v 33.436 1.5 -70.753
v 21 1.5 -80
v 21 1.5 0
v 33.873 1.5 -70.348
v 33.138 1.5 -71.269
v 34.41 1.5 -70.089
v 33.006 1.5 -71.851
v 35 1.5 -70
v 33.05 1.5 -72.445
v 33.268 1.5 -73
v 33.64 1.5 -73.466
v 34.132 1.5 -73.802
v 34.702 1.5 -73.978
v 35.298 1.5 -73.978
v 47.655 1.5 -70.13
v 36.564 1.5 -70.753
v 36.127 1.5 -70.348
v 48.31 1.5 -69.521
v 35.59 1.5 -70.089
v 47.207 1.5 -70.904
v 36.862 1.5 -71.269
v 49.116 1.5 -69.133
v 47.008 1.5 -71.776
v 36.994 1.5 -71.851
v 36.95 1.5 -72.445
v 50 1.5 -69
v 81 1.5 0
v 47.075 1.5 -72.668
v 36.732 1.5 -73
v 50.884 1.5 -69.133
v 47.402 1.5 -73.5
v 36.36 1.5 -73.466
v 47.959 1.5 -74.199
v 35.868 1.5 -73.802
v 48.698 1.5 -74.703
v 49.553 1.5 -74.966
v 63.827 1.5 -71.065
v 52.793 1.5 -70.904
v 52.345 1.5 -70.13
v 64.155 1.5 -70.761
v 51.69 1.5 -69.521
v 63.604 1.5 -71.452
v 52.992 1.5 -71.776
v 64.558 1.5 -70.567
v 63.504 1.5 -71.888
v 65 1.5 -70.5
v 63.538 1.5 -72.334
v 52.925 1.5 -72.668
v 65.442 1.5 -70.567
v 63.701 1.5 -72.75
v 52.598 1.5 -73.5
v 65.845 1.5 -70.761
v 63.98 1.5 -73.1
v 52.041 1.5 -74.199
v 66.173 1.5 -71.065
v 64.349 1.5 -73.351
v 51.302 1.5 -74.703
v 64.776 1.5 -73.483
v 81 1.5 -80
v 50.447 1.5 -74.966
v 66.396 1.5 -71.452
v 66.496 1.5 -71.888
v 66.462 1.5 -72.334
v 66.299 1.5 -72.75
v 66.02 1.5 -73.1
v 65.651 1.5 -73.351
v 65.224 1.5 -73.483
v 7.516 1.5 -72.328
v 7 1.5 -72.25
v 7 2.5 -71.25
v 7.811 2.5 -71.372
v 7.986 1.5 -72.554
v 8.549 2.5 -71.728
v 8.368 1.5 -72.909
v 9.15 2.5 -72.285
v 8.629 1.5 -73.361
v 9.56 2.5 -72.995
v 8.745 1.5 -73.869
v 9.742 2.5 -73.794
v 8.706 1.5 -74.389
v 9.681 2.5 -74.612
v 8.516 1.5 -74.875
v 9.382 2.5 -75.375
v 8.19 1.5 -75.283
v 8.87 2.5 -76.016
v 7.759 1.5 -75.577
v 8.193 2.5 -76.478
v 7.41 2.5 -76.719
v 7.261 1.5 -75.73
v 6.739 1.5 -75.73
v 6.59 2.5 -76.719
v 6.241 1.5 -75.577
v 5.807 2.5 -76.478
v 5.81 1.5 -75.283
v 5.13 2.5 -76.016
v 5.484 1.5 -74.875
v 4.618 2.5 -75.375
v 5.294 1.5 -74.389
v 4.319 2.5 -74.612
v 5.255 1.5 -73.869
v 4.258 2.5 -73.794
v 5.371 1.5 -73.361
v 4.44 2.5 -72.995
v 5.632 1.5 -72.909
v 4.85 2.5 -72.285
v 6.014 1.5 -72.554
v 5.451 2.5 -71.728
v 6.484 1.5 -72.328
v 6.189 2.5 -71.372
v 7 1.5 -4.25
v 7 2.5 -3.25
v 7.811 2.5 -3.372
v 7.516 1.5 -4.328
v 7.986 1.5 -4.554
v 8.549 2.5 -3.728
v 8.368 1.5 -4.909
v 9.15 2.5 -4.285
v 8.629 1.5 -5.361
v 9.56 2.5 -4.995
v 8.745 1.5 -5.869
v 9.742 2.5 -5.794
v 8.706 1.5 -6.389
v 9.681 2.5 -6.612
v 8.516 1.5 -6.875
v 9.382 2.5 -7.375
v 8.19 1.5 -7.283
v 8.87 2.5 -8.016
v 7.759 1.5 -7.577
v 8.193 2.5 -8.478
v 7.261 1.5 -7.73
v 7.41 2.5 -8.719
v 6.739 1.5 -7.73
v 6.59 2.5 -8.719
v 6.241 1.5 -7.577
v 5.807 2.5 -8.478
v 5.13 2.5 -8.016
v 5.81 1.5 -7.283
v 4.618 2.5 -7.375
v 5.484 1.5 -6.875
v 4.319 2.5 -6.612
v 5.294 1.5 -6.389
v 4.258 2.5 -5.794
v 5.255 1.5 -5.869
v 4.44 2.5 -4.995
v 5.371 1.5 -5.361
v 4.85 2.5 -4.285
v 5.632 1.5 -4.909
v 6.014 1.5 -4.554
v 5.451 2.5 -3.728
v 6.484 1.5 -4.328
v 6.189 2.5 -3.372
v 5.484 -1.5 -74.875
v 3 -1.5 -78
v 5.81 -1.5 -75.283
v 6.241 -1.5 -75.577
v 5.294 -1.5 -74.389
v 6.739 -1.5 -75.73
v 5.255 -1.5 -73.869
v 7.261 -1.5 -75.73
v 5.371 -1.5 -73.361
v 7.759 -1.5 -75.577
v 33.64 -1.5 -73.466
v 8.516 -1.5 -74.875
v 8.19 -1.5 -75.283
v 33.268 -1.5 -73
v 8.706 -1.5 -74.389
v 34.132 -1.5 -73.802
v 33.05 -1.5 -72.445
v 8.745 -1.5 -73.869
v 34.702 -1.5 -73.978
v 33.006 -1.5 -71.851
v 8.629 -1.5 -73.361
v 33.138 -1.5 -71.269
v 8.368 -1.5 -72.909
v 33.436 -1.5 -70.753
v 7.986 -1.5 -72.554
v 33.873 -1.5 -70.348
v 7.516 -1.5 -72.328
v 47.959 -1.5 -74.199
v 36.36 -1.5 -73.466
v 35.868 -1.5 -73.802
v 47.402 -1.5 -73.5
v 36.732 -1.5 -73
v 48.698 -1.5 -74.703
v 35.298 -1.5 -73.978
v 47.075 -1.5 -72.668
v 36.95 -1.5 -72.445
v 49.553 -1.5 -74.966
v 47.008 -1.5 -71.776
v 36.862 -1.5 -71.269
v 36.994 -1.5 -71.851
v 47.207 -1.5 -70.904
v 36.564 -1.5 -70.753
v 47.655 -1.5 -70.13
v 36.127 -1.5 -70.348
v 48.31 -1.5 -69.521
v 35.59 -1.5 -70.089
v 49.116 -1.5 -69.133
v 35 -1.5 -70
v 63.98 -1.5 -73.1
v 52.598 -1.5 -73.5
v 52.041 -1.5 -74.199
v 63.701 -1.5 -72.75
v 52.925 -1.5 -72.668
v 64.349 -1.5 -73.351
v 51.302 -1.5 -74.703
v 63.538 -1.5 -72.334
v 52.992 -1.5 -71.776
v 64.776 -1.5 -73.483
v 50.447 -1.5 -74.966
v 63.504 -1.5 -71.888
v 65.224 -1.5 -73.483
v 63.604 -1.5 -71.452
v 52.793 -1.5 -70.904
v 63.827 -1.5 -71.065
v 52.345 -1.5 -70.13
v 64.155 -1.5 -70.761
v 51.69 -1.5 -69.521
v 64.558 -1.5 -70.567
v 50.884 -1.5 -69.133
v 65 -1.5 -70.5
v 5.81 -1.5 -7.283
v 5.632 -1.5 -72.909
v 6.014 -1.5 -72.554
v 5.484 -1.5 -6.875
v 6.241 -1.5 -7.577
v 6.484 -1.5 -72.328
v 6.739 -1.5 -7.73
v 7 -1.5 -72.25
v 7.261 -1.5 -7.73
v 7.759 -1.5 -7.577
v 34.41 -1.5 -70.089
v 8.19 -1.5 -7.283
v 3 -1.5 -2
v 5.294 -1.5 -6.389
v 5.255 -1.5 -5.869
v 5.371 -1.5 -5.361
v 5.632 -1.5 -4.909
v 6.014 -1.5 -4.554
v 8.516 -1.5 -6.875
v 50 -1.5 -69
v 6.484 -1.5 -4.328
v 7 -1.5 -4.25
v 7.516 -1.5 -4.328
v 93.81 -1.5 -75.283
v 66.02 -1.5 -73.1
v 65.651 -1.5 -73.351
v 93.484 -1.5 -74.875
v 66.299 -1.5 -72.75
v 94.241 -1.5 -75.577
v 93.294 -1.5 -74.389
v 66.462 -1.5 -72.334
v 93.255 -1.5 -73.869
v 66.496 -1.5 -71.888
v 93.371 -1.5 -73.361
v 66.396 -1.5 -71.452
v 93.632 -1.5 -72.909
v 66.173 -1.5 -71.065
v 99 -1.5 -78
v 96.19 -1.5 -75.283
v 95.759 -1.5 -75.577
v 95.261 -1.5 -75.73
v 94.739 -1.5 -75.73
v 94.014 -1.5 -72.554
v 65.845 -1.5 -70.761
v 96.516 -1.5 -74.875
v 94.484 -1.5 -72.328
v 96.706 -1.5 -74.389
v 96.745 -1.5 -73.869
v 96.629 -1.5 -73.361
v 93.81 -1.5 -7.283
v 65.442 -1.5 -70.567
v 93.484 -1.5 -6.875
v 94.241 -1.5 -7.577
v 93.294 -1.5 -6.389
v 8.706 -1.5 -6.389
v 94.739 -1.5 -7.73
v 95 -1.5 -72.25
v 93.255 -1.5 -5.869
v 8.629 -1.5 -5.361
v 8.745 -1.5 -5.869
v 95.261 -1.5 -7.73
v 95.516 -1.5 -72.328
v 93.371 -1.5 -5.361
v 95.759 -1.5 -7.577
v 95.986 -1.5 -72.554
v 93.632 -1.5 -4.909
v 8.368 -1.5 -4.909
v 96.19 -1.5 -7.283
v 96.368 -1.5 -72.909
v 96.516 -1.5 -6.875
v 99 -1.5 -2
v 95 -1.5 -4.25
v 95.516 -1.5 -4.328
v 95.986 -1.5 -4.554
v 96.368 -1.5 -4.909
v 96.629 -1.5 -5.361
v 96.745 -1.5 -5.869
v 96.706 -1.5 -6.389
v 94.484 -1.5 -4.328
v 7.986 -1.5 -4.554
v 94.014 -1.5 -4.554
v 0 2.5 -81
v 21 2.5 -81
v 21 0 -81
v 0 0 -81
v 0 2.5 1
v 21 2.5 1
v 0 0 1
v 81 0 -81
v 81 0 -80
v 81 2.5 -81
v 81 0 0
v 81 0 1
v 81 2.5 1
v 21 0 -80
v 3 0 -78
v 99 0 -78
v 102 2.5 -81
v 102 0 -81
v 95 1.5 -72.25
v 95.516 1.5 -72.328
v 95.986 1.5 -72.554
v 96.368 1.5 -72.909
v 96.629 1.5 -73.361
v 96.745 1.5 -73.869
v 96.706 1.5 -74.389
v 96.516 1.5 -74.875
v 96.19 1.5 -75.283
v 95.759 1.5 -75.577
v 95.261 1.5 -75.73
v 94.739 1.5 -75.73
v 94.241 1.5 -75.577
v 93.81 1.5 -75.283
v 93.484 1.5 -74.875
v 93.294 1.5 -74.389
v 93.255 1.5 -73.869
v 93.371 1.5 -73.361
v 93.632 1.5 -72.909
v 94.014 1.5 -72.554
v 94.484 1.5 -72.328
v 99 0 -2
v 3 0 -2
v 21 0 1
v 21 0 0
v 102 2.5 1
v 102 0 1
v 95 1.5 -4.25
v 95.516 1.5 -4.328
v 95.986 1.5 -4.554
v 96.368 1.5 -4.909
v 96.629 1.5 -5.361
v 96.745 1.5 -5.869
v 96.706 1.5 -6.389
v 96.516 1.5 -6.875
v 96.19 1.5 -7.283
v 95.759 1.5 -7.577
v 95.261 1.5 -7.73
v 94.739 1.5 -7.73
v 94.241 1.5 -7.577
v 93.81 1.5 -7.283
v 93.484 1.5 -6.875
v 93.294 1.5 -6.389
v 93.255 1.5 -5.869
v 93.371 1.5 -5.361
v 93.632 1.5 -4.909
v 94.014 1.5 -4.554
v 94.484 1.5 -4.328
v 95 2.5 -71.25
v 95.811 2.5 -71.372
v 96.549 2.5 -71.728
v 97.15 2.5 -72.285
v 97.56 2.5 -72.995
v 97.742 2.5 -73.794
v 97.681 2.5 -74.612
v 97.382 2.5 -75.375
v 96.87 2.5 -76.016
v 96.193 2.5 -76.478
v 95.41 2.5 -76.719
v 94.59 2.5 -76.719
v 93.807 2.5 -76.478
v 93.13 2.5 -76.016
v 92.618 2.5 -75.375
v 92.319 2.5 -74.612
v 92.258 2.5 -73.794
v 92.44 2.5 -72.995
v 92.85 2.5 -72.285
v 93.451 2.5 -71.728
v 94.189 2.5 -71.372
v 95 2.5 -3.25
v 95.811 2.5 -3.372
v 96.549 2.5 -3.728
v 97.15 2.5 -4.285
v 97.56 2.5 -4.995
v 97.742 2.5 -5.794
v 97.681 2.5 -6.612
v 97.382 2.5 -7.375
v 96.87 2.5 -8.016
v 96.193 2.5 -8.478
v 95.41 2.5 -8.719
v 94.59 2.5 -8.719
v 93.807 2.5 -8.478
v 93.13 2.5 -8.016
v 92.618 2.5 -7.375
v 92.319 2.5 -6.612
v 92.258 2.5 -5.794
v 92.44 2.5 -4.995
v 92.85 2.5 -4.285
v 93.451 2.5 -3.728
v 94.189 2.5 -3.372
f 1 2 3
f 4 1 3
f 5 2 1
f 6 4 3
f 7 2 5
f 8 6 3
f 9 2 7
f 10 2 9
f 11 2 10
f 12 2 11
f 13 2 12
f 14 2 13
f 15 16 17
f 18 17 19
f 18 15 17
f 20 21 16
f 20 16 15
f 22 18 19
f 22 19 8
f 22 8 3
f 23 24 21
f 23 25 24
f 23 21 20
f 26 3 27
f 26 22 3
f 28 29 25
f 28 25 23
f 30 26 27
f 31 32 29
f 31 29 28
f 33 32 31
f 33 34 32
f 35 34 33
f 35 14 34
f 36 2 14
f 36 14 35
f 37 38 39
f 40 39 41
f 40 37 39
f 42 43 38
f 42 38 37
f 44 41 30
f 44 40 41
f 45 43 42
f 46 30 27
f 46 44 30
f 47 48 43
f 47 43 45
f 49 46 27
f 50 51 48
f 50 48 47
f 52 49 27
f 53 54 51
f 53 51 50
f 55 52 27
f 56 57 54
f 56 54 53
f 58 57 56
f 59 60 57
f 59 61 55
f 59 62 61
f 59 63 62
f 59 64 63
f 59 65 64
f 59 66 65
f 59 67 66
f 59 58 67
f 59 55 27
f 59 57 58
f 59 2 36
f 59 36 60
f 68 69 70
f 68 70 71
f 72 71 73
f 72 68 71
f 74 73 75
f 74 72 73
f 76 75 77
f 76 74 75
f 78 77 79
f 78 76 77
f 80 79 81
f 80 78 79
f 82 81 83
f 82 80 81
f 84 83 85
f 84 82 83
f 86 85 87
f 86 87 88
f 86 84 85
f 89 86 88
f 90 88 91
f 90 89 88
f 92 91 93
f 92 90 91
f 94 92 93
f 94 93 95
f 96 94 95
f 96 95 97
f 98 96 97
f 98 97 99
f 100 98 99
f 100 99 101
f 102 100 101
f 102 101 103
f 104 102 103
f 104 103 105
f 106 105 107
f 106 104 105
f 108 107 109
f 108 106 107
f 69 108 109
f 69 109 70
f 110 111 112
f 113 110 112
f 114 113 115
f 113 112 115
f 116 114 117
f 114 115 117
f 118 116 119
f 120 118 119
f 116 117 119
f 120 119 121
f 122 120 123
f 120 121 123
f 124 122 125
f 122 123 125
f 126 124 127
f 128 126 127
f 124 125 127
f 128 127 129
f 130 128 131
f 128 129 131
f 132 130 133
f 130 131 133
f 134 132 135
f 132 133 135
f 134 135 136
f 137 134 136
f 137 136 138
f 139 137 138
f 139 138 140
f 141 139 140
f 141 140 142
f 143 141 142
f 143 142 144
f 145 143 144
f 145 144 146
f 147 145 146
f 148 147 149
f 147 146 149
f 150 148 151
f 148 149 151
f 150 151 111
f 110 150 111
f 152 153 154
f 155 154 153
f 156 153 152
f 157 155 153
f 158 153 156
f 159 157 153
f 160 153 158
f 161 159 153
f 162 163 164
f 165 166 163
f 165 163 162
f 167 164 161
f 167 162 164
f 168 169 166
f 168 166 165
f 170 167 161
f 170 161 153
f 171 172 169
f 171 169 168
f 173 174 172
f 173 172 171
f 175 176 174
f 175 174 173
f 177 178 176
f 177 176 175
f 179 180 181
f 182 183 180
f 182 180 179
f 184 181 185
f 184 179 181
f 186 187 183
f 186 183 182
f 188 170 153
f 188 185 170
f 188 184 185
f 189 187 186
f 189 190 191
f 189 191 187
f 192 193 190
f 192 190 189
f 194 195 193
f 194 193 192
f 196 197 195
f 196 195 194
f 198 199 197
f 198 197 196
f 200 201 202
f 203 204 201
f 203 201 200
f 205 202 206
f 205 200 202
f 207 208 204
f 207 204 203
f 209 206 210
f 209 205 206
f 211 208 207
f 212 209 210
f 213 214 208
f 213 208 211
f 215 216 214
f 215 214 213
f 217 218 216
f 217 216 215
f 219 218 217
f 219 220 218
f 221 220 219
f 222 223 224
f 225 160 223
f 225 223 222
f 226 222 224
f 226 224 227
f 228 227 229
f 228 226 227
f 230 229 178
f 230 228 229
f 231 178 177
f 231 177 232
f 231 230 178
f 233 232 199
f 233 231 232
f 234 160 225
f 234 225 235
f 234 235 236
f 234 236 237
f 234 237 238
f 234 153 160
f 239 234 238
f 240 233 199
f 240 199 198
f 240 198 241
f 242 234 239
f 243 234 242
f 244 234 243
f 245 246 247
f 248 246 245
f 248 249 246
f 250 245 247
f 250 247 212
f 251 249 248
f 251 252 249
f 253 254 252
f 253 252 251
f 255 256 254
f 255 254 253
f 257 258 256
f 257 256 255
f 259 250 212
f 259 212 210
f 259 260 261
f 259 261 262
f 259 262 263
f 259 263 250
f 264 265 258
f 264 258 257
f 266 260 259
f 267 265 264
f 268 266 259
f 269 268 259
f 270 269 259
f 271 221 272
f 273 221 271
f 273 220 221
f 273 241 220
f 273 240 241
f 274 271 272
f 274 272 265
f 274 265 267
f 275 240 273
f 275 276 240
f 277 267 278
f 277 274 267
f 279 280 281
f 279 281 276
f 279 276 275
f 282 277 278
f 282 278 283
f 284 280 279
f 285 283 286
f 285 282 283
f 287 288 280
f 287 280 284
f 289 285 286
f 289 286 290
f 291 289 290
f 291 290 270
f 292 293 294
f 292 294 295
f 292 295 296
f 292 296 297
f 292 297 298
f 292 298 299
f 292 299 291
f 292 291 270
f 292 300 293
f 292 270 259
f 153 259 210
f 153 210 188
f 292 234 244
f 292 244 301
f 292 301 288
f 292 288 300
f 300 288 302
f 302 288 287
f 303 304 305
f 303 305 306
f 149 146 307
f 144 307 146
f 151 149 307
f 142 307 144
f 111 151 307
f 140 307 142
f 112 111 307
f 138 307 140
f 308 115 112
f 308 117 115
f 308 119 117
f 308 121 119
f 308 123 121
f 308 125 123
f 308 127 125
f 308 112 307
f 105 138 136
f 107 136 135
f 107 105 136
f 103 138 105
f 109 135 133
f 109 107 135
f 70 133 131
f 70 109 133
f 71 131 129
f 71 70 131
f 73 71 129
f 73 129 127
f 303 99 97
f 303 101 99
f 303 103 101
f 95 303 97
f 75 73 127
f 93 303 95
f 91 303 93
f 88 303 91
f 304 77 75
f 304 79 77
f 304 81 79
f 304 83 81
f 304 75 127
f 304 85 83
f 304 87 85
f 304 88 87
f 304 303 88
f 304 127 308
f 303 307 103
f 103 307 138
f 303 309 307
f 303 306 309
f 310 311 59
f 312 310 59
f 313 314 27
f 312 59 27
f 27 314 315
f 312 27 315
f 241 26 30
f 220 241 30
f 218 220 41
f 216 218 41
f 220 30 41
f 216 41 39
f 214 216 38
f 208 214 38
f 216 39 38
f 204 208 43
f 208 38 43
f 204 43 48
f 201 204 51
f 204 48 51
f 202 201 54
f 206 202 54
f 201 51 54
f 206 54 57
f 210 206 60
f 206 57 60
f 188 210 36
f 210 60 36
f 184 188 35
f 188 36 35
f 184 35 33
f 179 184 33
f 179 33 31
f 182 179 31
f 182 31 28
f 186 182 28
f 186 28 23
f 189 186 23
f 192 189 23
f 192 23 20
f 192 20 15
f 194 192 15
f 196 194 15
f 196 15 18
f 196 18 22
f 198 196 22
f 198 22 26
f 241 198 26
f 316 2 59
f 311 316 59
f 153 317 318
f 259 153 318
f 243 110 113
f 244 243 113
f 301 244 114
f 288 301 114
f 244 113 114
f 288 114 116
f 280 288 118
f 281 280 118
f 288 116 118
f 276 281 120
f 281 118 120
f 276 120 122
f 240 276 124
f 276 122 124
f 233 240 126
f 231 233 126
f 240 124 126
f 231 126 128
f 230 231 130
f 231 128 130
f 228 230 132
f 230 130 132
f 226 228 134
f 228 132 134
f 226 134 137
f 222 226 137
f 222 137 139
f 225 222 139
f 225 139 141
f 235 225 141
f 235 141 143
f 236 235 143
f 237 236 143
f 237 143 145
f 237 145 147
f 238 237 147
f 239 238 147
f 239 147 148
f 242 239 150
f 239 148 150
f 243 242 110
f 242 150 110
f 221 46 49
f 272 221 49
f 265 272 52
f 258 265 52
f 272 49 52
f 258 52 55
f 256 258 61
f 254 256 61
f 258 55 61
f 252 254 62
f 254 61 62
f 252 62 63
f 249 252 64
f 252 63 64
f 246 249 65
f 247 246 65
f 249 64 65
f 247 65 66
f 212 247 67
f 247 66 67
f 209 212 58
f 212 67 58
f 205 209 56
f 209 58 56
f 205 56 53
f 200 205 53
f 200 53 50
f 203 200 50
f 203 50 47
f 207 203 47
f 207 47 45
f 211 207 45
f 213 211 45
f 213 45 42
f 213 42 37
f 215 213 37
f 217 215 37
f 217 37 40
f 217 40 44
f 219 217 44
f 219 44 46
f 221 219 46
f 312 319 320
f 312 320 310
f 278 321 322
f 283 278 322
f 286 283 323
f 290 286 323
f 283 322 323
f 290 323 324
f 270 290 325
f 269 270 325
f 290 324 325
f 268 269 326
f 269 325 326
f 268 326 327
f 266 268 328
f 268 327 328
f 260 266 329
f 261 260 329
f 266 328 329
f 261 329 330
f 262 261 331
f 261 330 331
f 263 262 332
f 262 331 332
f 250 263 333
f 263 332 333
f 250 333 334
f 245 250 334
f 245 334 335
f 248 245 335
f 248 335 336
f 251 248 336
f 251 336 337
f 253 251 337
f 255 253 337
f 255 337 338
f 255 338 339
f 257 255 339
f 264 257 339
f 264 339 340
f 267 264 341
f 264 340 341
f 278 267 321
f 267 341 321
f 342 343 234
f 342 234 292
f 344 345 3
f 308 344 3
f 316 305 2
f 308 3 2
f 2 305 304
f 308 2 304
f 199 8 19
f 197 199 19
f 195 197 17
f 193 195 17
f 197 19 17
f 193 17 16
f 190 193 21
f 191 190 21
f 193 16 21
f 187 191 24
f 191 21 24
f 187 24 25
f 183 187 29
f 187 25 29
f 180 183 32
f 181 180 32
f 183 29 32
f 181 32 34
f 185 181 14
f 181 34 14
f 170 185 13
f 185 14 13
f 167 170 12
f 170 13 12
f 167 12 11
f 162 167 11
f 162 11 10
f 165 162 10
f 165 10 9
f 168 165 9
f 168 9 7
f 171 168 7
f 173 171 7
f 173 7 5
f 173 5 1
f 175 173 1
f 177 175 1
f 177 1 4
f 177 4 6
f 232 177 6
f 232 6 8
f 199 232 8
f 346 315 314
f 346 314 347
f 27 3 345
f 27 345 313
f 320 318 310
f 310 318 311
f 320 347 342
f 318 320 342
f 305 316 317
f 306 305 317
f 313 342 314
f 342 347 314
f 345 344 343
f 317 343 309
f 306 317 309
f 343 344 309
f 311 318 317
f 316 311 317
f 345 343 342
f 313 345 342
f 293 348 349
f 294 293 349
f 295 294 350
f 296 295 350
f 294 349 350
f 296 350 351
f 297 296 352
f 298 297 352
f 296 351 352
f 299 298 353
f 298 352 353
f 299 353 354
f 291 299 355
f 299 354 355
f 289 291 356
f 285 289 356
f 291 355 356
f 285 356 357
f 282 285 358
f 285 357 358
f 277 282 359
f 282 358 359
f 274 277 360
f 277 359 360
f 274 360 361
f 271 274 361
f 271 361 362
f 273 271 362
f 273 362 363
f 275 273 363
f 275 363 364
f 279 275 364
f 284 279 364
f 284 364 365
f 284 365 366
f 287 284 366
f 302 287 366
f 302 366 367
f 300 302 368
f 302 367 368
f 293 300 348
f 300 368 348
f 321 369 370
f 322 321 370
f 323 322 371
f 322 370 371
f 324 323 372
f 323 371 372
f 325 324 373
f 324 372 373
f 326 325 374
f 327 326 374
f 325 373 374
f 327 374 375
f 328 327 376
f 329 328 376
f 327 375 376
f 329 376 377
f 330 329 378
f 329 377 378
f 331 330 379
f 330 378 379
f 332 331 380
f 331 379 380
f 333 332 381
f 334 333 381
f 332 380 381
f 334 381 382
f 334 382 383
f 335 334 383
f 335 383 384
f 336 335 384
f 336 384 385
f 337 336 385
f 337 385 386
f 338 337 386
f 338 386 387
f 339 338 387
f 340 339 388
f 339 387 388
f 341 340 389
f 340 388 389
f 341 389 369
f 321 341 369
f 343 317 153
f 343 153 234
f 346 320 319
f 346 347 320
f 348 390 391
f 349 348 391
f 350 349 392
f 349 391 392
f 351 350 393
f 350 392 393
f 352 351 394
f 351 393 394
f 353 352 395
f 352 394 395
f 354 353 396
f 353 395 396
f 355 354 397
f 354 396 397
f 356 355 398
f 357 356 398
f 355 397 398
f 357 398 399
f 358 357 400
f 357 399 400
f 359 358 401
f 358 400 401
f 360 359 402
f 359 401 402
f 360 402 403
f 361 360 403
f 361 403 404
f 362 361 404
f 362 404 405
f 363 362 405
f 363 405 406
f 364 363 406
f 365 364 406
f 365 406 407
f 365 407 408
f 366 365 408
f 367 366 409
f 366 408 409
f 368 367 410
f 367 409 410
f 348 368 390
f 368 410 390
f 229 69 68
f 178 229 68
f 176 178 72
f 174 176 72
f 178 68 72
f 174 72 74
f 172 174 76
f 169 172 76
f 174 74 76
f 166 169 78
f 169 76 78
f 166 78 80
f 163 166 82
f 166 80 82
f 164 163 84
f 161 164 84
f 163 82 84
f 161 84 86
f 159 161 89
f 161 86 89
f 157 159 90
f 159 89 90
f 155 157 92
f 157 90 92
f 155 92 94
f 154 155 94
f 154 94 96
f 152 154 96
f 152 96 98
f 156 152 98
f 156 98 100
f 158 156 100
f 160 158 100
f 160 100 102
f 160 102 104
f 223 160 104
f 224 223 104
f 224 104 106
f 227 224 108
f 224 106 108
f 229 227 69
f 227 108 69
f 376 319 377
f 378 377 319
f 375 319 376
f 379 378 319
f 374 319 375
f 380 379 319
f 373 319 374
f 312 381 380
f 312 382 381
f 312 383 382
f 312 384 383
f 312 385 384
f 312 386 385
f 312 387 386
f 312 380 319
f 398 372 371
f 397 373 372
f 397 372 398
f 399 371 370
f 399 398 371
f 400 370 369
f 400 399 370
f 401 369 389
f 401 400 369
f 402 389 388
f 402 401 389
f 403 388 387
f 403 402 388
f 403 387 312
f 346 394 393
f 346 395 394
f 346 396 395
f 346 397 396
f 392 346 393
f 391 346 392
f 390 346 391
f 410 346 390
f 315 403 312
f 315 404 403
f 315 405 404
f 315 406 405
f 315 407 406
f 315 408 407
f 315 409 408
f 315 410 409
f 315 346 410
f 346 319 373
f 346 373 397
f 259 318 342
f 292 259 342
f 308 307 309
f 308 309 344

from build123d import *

# Parameters (mm, degrees)
ESQUISSE1_W             = 102
ESQUISSE1_H             = 80
BOSS_EXTRU_1_DEPTH      = 1.5
ESQUISSE2_W             = 96
ESQUISSE2_H             = 76
BOSS_EXTRU_2_DEPTH      = 1.5
ESQUISSE3_R             = 1.75
ESQUISSE3_R_2           = 2
ESQUISSE3_R_3           = 3
ESQUISSE3_R_4           = 1.5
ENL_V_MAT_EXTRU_1_DEPTH = 5
BOSS_EXTRU_5_START      = 1
ESQUISSE6_W             = 21
ESQUISSE6_H             = 80
ESQUISSE6_R             = 1.75
BOSS_EXTRU_5_DEPTH      = 1
CHANFREIN2_SIZE         = 1
ESQUISSE7_W             = 21
ESQUISSE7_H             = 2.5
BOSS_EXTRU_6_DEPTH      = 1
ESQUISSE8_W             = 21
ESQUISSE8_H             = 2.5
BOSS_EXTRU_7_DEPTH      = 1


with BuildPart() as part:
    # Esquisse1 → Boss.-Extru.1 (new body)
    with BuildSketch(Plane(origin=(0, 0, 0), x_dir=(1, 0, 0), z_dir=(0, 1, 0))):
        with Locations((51, 40)):
            Rectangle(ESQUISSE1_W, ESQUISSE1_H)
    extrude(amount=BOSS_EXTRU_1_DEPTH)

    # Esquisse2 → Boss.-Extru.2 (add)
    with BuildSketch(Plane.XZ):
        with Locations((51, -40)):
            Rectangle(ESQUISSE2_W, ESQUISSE2_H)
    extrude(amount=BOSS_EXTRU_2_DEPTH)

    # Esquisse3 → Enlèv. mat.-Extru.1 (cut)
    with BuildSketch(Plane(origin=(0, 1.5, 0), x_dir=(1, 0, 0), z_dir=(0, 1, 0))):
        with Locations((7, 74)):
            Circle(ESQUISSE3_R)
        with Locations((7, 6)):
            Circle(ESQUISSE3_R)
        with Locations((95, 6)):
            Circle(ESQUISSE3_R)
        with Locations((95, 74)):
            Circle(ESQUISSE3_R)
        with Locations((35, 72)):
            Circle(ESQUISSE3_R_2)
        with Locations((50, 72)):
            Circle(ESQUISSE3_R_3)
        with Locations((65, 72)):
            Circle(ESQUISSE3_R_4)
    extrude(amount=-ENL_V_MAT_EXTRU_1_DEPTH, mode=Mode.SUBTRACT)

    # Esquisse6 → Boss.-Extru.5 (add)
    # profile 1 of 2: a face of its own
    with BuildSketch(Plane(origin=(0, 1.5, 0), x_dir=(1, 0, 0), z_dir=(0, 1, 0)).offset(BOSS_EXTRU_5_START)):
        with Locations((91.5, 40)):
            Rectangle(ESQUISSE6_W, ESQUISSE6_H)
        with Locations((95, 6)):
            Circle(ESQUISSE6_R, mode=Mode.SUBTRACT)
        with Locations((95, 74)):
            Circle(ESQUISSE6_R, mode=Mode.SUBTRACT)
    # profile 2 of 2: a face of its own
    with BuildSketch(Plane(origin=(0, 1.5, 0), x_dir=(1, 0, 0), z_dir=(0, 1, 0)).offset(BOSS_EXTRU_5_START)):
        with Locations((10.5, 40)):
            Rectangle(ESQUISSE6_W, ESQUISSE6_H)
        with Locations((7, 74)):
            Circle(ESQUISSE6_R, mode=Mode.SUBTRACT)
        with Locations((7, 6)):
            Circle(ESQUISSE6_R, mode=Mode.SUBTRACT)
    extrude(amount=-BOSS_EXTRU_5_DEPTH)

    # Chanfrein2
    chanfrein2_edges = [part.edges().sort_by_distance(p)[0] for p in [
        (5.25, 2.5, -74),
        (5.25, 2.5, -6),
        (93.25, 2.5, -6),
        (93.25, 2.5, -74),
    ]]
    chamfer(chanfrein2_edges, length=CHANFREIN2_SIZE)

    # Esquisse7 → Boss.-Extru.6 (add)
    with BuildSketch(Plane.XY):
        with Locations((10.5, 1.25)):
            Rectangle(ESQUISSE7_W, ESQUISSE7_H)
        with Locations((91.5, 1.25)):
            Rectangle(ESQUISSE7_W, ESQUISSE7_H)
    extrude(amount=BOSS_EXTRU_6_DEPTH)

    # Esquisse8 → Boss.-Extru.7 (add)
    with BuildSketch(Plane(origin=(0, 0, -80), x_dir=(-1, 0, 0), z_dir=(0, 0, -1))):
        with Locations((-91.5, 1.25)):
            Rectangle(ESQUISSE8_W, ESQUISSE8_H)
        with Locations((-10.5, 1.25)):
            Rectangle(ESQUISSE8_W, ESQUISSE8_H)
    extrude(amount=BOSS_EXTRU_7_DEPTH)


solid = part.part
